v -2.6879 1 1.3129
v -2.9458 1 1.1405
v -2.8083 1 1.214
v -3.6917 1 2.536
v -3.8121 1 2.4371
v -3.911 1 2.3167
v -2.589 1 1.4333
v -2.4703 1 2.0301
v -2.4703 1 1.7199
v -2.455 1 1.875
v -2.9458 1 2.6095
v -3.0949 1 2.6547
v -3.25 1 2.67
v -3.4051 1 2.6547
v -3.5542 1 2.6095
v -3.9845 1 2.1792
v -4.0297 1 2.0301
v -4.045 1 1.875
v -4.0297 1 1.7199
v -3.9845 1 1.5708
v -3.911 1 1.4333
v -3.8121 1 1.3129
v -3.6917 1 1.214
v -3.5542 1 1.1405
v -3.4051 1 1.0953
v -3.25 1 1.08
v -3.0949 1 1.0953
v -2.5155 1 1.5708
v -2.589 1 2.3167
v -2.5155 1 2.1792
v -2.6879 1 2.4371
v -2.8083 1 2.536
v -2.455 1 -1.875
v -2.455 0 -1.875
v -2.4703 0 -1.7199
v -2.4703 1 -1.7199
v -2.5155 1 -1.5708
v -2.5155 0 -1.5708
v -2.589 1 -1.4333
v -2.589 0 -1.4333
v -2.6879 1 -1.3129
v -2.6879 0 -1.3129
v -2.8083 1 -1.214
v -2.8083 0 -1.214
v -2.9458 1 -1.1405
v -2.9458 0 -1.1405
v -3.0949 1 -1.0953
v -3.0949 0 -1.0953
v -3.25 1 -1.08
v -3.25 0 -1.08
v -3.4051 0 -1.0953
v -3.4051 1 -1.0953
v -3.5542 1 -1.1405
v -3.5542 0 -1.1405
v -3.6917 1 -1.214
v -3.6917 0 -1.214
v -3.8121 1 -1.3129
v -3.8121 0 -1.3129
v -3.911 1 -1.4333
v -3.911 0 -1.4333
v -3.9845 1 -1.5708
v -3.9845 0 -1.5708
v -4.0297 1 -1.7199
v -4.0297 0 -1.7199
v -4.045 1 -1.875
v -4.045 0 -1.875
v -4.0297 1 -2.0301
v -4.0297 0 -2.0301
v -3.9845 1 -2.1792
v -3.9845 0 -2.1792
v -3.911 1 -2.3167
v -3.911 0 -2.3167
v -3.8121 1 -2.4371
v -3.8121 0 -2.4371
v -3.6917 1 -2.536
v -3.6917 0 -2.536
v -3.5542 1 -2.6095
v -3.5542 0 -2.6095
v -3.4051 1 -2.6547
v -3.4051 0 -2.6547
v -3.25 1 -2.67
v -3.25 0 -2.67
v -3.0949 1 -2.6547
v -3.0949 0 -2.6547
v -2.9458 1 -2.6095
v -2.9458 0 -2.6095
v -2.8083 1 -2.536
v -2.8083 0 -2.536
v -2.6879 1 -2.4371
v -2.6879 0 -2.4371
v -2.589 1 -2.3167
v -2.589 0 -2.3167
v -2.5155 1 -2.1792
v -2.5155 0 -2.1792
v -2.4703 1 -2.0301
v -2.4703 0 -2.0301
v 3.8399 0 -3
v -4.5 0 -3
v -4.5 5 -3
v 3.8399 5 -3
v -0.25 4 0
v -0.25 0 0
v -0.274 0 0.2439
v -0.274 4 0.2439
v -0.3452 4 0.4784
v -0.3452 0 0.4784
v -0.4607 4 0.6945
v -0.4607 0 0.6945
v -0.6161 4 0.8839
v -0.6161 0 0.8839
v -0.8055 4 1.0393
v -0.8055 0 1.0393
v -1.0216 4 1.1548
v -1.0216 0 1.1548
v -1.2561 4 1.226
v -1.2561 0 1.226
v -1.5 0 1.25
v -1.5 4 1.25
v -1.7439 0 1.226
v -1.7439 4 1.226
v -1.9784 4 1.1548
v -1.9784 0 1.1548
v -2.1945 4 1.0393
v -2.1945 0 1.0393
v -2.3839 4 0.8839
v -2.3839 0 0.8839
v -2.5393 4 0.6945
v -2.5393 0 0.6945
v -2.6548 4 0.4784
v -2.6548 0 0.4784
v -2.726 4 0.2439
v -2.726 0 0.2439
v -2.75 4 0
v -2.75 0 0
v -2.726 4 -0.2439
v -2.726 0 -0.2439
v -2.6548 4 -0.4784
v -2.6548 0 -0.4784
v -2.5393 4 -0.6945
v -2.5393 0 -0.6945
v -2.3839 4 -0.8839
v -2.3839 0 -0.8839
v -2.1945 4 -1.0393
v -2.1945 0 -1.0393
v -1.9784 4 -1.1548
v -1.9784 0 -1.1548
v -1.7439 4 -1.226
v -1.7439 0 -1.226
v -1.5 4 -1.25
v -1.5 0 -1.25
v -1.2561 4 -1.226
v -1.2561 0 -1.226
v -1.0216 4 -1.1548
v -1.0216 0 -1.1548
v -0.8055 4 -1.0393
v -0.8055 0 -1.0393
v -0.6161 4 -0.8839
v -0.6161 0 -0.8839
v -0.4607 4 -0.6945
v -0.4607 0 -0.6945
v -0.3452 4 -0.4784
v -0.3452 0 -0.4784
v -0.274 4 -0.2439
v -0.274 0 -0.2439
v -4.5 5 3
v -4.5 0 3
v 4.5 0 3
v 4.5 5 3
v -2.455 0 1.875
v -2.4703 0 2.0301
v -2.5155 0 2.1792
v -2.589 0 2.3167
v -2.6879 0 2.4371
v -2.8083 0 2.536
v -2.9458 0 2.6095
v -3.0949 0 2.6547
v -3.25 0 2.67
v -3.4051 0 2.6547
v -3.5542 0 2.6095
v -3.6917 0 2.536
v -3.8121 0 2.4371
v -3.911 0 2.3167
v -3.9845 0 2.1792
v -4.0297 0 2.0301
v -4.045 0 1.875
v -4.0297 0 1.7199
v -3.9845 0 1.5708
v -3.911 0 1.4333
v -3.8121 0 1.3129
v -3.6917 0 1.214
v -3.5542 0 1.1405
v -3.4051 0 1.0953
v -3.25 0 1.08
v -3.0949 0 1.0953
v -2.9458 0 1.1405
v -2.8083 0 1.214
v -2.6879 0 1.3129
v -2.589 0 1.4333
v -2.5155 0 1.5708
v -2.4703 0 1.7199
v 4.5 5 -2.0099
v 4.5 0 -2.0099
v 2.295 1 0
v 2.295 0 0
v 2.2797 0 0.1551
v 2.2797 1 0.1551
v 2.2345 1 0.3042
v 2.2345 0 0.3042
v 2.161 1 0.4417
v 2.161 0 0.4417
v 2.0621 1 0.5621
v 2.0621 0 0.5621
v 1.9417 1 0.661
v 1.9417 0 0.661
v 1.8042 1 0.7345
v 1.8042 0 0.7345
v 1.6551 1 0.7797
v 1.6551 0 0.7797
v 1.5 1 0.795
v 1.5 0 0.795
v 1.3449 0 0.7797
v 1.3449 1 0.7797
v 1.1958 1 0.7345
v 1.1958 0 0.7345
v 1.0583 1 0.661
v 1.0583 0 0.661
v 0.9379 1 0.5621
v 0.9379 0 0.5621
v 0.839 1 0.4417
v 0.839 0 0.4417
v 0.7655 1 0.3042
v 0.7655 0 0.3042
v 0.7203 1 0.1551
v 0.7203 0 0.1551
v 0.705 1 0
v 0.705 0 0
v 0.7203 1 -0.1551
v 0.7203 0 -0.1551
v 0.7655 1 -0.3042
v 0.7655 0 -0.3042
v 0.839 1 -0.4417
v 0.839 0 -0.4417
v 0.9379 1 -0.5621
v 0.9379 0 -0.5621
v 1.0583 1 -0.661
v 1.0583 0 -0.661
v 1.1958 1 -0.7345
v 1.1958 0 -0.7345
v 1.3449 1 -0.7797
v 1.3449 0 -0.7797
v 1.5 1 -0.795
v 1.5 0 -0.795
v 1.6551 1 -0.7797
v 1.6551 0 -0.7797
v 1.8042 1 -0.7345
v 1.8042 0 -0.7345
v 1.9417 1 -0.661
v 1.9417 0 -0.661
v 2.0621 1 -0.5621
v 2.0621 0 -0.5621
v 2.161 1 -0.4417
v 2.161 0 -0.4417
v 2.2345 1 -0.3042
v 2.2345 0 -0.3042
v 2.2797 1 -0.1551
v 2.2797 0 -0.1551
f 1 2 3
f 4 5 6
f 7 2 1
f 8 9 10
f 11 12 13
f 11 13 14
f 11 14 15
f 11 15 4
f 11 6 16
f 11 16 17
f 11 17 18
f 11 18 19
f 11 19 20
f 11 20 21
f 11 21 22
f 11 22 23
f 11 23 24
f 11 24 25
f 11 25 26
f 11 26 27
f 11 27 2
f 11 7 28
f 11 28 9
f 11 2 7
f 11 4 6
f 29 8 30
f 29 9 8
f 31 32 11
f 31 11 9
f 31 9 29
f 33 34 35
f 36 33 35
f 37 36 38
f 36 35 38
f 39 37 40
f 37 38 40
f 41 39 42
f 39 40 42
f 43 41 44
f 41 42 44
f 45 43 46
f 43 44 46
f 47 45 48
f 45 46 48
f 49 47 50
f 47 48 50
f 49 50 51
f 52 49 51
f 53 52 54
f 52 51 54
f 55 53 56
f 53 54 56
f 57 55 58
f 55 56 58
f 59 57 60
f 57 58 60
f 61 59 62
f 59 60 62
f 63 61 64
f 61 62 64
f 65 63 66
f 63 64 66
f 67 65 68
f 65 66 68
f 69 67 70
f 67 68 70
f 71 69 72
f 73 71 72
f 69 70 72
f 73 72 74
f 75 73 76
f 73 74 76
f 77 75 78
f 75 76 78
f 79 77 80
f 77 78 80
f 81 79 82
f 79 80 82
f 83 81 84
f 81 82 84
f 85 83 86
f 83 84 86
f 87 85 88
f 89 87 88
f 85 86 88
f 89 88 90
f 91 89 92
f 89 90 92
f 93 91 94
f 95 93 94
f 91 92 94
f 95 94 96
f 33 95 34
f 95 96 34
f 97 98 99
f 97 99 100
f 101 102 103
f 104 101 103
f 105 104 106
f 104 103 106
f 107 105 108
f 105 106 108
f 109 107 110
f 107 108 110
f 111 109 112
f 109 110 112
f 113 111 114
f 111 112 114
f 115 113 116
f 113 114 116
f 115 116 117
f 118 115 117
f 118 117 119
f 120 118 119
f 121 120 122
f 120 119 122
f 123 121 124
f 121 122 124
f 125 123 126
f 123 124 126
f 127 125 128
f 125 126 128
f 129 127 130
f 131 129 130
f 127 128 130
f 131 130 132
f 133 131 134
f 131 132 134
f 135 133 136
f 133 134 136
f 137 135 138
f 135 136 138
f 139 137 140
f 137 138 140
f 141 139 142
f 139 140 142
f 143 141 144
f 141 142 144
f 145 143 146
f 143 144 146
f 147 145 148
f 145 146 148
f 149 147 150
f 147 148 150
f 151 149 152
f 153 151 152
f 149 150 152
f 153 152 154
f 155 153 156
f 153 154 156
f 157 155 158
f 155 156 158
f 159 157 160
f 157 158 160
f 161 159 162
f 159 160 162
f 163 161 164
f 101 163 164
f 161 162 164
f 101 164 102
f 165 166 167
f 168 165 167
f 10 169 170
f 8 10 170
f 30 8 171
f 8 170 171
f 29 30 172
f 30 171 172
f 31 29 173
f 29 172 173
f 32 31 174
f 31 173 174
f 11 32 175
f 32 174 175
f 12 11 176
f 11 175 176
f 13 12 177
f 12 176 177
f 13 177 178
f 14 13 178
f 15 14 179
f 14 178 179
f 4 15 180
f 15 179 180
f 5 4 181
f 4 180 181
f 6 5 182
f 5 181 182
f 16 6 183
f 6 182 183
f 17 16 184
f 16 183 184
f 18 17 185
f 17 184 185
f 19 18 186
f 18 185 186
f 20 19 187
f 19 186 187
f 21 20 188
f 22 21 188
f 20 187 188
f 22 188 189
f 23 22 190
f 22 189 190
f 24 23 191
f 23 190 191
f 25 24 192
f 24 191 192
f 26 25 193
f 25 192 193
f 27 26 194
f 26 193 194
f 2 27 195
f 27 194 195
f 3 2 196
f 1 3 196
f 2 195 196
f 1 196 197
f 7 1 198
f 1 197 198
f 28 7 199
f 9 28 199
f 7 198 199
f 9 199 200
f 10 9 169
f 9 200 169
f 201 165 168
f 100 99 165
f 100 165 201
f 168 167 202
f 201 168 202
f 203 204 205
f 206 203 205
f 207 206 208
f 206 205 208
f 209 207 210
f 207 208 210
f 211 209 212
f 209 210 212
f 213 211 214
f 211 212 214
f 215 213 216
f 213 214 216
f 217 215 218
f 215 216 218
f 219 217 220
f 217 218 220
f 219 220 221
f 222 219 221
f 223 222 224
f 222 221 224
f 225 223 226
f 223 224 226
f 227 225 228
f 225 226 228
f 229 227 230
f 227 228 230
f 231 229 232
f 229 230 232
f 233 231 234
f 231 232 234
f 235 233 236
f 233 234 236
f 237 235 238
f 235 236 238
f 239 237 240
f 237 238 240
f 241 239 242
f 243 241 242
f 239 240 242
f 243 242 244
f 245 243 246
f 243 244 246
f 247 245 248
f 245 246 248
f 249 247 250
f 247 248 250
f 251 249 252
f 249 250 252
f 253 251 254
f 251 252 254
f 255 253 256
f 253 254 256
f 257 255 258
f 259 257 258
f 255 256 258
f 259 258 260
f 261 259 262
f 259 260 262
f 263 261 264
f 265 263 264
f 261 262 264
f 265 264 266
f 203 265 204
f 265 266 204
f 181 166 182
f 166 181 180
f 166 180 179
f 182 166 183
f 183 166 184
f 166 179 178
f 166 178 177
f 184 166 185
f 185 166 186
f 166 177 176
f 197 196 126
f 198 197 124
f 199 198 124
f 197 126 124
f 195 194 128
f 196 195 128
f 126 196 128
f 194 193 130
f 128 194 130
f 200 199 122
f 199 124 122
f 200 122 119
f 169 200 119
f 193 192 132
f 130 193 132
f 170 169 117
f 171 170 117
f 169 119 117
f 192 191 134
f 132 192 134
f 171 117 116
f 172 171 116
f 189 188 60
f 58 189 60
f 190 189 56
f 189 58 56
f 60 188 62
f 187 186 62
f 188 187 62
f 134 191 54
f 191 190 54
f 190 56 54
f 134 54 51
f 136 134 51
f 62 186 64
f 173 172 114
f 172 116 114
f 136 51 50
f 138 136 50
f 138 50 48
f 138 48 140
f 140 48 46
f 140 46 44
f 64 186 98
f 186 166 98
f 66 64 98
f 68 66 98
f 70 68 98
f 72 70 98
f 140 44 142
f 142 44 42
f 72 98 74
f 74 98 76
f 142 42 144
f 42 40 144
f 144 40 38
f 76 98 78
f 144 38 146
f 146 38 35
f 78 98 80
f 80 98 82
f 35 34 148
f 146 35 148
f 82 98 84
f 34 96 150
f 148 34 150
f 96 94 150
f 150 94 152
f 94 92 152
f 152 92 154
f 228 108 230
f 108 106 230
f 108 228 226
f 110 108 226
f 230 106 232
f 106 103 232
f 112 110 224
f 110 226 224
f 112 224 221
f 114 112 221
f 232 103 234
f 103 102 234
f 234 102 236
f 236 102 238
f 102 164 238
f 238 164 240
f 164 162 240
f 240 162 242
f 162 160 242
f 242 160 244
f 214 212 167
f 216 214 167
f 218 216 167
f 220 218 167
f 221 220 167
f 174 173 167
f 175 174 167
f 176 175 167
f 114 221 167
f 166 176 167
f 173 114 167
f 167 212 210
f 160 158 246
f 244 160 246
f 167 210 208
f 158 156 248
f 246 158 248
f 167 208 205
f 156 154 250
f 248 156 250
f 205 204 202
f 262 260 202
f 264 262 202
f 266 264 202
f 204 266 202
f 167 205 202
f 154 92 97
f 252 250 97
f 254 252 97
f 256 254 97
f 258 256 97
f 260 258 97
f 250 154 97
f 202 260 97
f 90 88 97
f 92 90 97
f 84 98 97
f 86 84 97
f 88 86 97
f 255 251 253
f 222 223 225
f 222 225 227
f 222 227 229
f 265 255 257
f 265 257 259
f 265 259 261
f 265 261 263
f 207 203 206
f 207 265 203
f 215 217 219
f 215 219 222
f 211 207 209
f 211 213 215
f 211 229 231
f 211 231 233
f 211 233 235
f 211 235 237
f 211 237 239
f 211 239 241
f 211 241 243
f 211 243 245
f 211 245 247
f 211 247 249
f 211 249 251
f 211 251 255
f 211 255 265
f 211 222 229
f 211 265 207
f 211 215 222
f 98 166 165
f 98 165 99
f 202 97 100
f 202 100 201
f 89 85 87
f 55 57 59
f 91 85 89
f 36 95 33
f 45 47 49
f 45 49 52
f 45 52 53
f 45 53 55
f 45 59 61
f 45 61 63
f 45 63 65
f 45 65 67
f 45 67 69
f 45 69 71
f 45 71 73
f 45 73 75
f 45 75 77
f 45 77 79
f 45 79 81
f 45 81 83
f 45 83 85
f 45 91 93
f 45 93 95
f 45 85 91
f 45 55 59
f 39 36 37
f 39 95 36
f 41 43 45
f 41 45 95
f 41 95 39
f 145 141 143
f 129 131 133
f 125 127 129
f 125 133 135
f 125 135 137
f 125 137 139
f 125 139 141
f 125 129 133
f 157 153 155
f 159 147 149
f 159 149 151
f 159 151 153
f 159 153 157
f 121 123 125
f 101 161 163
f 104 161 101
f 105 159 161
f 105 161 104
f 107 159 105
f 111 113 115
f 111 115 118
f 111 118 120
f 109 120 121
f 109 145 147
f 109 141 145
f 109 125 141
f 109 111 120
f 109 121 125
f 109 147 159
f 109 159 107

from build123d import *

# Parameters (mm, degrees)
SKETCH1_W           = 9
SKETCH1_H           = 6
BOSS_EXTRUDE1_DEPTH = 5
SKETCH3_R           = 1.25
CUT_EXTRUDE2_DEPTH  = 4
SKETCH2_R           = 0.795
CUT_EXTRUDE1_DEPTH  = 1
CUT_EXTRUDE3_DEPTH  = 6


with BuildPart() as part:
    # Sketch1 → Boss-Extrude1 (new body)
    with BuildSketch(Plane(origin=(0, 0, 0), x_dir=(1, 0, 0), z_dir=(0, 1, 0))):
        Rectangle(SKETCH1_W, SKETCH1_H)
    extrude(amount=BOSS_EXTRUDE1_DEPTH)

    # Sketch3 → Cut-Extrude2 (cut)
    with BuildSketch(Plane.XZ):
        with Locations((-1.5, 0)):
            Circle(SKETCH3_R)
    extrude(amount=-CUT_EXTRUDE2_DEPTH, mode=Mode.SUBTRACT)

    # Sketch2 → Cut-Extrude1 (cut)
    with BuildSketch(Plane.XZ):
        with Locations((-3.25, -1.875)):
            Circle(SKETCH2_R)
        with Locations((-3.25, 1.875)):
            Circle(SKETCH2_R)
        with Locations((1.5, 0)):
            Circle(SKETCH2_R)
    extrude(amount=-CUT_EXTRUDE1_DEPTH, mode=Mode.SUBTRACT)

    # Sketch4 → Cut-Extrude3 (cut, through all)
    with BuildSketch(Plane.XZ):
        Polygon((3.839906766, -3), (4.5, -2.00986015), (4.5, -3), align=None)
    extrude(amount=-CUT_EXTRUDE3_DEPTH, mode=Mode.SUBTRACT)


solid = part.part
